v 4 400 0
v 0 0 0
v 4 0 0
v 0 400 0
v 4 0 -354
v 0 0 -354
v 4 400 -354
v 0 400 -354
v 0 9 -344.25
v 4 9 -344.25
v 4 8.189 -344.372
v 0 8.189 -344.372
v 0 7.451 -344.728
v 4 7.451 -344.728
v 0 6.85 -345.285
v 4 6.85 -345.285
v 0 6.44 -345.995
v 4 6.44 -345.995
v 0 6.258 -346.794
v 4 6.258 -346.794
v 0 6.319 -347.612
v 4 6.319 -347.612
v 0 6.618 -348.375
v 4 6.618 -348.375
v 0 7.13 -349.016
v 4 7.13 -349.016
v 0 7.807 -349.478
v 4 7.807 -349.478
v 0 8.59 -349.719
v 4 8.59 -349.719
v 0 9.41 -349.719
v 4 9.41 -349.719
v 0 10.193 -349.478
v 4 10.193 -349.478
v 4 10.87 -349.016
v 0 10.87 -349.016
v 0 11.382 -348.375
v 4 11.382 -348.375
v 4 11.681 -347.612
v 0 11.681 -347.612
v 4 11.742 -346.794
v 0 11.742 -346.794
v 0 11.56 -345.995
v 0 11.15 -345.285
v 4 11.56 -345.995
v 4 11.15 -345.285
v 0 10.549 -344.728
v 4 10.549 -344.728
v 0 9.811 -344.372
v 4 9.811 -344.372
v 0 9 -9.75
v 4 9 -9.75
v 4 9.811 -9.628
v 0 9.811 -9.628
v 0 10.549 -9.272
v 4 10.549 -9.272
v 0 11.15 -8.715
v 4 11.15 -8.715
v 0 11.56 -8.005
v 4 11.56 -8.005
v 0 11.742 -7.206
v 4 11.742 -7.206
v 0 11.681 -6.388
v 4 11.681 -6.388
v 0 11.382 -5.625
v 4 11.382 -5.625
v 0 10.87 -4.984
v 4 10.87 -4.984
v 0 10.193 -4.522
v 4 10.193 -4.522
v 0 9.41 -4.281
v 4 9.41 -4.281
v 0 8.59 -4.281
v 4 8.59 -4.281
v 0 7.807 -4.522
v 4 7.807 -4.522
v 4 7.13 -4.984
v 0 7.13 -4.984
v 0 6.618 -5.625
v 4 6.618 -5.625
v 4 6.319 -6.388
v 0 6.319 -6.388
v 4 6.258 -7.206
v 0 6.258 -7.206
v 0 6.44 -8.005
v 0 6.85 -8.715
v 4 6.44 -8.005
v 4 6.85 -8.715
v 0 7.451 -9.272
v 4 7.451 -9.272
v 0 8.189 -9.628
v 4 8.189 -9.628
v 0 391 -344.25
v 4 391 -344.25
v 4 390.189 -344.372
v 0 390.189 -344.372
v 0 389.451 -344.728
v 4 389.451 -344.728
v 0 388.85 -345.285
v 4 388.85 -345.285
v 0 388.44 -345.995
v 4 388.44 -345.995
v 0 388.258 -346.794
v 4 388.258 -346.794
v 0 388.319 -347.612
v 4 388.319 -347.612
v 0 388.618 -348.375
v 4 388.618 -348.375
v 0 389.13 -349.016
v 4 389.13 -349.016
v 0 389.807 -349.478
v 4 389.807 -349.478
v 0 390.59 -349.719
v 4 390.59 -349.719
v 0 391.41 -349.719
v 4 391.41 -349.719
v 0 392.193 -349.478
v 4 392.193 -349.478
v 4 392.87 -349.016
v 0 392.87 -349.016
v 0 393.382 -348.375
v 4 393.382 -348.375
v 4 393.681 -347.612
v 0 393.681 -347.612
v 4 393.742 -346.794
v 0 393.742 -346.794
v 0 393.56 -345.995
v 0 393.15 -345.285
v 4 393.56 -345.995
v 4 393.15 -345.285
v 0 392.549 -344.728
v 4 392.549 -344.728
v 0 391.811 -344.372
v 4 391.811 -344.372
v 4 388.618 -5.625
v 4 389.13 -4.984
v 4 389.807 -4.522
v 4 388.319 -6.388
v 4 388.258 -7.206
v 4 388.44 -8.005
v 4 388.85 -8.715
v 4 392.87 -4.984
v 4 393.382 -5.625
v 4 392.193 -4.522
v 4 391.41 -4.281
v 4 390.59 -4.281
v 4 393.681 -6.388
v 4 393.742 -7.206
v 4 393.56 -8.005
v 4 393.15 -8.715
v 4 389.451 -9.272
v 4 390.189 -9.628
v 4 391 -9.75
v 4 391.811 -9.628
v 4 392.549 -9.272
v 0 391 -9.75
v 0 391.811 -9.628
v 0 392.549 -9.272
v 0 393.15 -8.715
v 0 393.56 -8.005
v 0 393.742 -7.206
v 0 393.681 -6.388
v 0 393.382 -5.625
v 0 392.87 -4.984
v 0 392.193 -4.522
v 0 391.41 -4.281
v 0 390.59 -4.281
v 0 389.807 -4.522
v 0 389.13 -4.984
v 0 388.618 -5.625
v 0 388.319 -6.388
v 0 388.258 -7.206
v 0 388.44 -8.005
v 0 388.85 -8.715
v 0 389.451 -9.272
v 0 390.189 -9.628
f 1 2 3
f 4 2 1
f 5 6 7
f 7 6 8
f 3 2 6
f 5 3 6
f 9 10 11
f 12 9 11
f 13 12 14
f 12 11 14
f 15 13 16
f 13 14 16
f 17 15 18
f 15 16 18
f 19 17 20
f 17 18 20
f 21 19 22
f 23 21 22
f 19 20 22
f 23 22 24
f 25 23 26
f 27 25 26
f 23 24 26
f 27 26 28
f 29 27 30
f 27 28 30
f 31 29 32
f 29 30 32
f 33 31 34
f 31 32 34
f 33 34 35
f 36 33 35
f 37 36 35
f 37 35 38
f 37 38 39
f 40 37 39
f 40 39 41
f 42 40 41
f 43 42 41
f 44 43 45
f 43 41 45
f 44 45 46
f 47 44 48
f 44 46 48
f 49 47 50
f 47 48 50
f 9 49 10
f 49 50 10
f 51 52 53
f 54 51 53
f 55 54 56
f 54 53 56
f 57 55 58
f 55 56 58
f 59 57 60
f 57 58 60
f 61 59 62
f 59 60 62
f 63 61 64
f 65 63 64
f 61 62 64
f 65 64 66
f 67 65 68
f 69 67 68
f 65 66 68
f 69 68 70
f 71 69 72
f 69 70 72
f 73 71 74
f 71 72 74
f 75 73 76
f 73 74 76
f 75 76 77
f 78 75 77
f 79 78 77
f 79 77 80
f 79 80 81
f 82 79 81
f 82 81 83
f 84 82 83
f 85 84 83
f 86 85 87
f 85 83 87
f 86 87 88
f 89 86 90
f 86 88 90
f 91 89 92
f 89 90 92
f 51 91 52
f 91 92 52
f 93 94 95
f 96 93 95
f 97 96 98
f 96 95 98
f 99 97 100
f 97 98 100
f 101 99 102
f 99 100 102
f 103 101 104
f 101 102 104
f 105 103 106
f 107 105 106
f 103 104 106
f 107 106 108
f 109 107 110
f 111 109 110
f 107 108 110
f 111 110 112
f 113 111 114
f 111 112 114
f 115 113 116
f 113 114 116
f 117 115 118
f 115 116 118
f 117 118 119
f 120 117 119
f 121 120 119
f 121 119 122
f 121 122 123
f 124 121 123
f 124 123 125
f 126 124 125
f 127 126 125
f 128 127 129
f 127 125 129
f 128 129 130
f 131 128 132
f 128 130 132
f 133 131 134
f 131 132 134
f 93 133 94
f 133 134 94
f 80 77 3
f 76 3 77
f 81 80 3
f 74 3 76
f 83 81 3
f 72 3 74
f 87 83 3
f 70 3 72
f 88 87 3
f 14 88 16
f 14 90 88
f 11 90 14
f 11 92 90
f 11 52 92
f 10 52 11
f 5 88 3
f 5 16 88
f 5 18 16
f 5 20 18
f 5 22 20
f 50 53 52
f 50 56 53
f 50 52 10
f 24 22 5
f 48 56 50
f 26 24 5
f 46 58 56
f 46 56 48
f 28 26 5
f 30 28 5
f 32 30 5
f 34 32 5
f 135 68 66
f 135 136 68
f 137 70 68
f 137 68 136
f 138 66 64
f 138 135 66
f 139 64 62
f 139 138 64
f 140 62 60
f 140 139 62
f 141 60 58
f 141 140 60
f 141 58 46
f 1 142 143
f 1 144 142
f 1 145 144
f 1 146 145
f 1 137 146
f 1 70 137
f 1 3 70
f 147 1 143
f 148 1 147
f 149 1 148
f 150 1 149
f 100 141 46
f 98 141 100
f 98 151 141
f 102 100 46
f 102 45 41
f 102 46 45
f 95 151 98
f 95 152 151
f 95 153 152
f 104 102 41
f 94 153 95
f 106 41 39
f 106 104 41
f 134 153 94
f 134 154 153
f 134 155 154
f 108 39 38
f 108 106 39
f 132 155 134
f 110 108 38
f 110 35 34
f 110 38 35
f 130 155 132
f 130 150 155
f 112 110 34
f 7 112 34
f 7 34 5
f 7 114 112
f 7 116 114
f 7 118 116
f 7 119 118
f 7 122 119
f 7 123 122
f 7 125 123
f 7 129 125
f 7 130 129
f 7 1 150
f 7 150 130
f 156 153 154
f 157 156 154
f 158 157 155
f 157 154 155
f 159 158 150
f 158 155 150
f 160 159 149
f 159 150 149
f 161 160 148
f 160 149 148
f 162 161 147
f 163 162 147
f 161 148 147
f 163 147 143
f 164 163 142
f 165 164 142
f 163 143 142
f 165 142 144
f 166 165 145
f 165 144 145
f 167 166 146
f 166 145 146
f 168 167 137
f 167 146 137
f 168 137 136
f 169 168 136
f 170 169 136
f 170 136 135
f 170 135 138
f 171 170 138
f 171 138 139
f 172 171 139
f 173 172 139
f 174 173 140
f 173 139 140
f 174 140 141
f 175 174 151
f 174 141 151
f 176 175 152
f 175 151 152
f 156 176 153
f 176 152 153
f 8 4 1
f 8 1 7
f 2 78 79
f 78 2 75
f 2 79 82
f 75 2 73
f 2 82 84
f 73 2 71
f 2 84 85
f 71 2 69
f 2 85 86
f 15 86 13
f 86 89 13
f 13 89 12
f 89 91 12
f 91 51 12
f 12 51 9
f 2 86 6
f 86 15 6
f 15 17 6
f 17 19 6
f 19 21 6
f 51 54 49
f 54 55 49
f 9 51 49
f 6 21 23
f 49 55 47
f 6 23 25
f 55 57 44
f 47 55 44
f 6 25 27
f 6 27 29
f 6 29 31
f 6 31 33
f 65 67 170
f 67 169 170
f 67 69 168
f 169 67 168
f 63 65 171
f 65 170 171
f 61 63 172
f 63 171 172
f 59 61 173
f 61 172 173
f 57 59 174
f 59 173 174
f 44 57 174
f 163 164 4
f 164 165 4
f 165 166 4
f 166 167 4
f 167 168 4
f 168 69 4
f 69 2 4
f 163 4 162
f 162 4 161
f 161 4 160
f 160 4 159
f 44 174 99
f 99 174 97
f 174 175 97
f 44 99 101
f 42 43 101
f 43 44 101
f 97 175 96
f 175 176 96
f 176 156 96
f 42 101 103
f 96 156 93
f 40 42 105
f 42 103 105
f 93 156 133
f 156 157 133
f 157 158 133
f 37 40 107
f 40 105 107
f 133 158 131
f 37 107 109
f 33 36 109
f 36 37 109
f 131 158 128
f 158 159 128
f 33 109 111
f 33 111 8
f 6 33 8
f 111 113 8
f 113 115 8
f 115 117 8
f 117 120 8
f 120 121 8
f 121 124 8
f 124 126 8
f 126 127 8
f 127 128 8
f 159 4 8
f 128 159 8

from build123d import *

# Parameters (mm, degrees)
SKETCH_1_W          = 354
SKETCH_1_H          = 400
EXTRUDE_1_DEPTH     = 4
SKETCH_2_R          = 2.75
CUT_EXTRUDE_1_DEPTH = 4


with BuildPart() as part:
    # 草图1 → 凸台-拉伸1 (new body)
    with BuildSketch(Plane(origin=(0, 0, 0), x_dir=(0, 0, -1), z_dir=(1, 0, 0))):
        with Locations((177, 200)):
            Rectangle(SKETCH_1_W, SKETCH_1_H)
    extrude(amount=EXTRUDE_1_DEPTH)

    # 草图2 → 切除-拉伸1 (cut)
    with BuildSketch(Plane(origin=(4, 0, 0), x_dir=(0, 0, -1), z_dir=(1, 0, 0))):
        with Locations((7, 391)):
            Circle(SKETCH_2_R)
        with Locations((7, 9)):
            Circle(SKETCH_2_R)
        with Locations(Location((347, 9, 0), (0, 0, 180))):
            Circle(SKETCH_2_R)
        with Locations(Location((347, 391, 0), (0, 0, 180))):
            Circle(SKETCH_2_R)
    extrude(amount=-CUT_EXTRUDE_1_DEPTH, mode=Mode.SUBTRACT)


solid = part.part
